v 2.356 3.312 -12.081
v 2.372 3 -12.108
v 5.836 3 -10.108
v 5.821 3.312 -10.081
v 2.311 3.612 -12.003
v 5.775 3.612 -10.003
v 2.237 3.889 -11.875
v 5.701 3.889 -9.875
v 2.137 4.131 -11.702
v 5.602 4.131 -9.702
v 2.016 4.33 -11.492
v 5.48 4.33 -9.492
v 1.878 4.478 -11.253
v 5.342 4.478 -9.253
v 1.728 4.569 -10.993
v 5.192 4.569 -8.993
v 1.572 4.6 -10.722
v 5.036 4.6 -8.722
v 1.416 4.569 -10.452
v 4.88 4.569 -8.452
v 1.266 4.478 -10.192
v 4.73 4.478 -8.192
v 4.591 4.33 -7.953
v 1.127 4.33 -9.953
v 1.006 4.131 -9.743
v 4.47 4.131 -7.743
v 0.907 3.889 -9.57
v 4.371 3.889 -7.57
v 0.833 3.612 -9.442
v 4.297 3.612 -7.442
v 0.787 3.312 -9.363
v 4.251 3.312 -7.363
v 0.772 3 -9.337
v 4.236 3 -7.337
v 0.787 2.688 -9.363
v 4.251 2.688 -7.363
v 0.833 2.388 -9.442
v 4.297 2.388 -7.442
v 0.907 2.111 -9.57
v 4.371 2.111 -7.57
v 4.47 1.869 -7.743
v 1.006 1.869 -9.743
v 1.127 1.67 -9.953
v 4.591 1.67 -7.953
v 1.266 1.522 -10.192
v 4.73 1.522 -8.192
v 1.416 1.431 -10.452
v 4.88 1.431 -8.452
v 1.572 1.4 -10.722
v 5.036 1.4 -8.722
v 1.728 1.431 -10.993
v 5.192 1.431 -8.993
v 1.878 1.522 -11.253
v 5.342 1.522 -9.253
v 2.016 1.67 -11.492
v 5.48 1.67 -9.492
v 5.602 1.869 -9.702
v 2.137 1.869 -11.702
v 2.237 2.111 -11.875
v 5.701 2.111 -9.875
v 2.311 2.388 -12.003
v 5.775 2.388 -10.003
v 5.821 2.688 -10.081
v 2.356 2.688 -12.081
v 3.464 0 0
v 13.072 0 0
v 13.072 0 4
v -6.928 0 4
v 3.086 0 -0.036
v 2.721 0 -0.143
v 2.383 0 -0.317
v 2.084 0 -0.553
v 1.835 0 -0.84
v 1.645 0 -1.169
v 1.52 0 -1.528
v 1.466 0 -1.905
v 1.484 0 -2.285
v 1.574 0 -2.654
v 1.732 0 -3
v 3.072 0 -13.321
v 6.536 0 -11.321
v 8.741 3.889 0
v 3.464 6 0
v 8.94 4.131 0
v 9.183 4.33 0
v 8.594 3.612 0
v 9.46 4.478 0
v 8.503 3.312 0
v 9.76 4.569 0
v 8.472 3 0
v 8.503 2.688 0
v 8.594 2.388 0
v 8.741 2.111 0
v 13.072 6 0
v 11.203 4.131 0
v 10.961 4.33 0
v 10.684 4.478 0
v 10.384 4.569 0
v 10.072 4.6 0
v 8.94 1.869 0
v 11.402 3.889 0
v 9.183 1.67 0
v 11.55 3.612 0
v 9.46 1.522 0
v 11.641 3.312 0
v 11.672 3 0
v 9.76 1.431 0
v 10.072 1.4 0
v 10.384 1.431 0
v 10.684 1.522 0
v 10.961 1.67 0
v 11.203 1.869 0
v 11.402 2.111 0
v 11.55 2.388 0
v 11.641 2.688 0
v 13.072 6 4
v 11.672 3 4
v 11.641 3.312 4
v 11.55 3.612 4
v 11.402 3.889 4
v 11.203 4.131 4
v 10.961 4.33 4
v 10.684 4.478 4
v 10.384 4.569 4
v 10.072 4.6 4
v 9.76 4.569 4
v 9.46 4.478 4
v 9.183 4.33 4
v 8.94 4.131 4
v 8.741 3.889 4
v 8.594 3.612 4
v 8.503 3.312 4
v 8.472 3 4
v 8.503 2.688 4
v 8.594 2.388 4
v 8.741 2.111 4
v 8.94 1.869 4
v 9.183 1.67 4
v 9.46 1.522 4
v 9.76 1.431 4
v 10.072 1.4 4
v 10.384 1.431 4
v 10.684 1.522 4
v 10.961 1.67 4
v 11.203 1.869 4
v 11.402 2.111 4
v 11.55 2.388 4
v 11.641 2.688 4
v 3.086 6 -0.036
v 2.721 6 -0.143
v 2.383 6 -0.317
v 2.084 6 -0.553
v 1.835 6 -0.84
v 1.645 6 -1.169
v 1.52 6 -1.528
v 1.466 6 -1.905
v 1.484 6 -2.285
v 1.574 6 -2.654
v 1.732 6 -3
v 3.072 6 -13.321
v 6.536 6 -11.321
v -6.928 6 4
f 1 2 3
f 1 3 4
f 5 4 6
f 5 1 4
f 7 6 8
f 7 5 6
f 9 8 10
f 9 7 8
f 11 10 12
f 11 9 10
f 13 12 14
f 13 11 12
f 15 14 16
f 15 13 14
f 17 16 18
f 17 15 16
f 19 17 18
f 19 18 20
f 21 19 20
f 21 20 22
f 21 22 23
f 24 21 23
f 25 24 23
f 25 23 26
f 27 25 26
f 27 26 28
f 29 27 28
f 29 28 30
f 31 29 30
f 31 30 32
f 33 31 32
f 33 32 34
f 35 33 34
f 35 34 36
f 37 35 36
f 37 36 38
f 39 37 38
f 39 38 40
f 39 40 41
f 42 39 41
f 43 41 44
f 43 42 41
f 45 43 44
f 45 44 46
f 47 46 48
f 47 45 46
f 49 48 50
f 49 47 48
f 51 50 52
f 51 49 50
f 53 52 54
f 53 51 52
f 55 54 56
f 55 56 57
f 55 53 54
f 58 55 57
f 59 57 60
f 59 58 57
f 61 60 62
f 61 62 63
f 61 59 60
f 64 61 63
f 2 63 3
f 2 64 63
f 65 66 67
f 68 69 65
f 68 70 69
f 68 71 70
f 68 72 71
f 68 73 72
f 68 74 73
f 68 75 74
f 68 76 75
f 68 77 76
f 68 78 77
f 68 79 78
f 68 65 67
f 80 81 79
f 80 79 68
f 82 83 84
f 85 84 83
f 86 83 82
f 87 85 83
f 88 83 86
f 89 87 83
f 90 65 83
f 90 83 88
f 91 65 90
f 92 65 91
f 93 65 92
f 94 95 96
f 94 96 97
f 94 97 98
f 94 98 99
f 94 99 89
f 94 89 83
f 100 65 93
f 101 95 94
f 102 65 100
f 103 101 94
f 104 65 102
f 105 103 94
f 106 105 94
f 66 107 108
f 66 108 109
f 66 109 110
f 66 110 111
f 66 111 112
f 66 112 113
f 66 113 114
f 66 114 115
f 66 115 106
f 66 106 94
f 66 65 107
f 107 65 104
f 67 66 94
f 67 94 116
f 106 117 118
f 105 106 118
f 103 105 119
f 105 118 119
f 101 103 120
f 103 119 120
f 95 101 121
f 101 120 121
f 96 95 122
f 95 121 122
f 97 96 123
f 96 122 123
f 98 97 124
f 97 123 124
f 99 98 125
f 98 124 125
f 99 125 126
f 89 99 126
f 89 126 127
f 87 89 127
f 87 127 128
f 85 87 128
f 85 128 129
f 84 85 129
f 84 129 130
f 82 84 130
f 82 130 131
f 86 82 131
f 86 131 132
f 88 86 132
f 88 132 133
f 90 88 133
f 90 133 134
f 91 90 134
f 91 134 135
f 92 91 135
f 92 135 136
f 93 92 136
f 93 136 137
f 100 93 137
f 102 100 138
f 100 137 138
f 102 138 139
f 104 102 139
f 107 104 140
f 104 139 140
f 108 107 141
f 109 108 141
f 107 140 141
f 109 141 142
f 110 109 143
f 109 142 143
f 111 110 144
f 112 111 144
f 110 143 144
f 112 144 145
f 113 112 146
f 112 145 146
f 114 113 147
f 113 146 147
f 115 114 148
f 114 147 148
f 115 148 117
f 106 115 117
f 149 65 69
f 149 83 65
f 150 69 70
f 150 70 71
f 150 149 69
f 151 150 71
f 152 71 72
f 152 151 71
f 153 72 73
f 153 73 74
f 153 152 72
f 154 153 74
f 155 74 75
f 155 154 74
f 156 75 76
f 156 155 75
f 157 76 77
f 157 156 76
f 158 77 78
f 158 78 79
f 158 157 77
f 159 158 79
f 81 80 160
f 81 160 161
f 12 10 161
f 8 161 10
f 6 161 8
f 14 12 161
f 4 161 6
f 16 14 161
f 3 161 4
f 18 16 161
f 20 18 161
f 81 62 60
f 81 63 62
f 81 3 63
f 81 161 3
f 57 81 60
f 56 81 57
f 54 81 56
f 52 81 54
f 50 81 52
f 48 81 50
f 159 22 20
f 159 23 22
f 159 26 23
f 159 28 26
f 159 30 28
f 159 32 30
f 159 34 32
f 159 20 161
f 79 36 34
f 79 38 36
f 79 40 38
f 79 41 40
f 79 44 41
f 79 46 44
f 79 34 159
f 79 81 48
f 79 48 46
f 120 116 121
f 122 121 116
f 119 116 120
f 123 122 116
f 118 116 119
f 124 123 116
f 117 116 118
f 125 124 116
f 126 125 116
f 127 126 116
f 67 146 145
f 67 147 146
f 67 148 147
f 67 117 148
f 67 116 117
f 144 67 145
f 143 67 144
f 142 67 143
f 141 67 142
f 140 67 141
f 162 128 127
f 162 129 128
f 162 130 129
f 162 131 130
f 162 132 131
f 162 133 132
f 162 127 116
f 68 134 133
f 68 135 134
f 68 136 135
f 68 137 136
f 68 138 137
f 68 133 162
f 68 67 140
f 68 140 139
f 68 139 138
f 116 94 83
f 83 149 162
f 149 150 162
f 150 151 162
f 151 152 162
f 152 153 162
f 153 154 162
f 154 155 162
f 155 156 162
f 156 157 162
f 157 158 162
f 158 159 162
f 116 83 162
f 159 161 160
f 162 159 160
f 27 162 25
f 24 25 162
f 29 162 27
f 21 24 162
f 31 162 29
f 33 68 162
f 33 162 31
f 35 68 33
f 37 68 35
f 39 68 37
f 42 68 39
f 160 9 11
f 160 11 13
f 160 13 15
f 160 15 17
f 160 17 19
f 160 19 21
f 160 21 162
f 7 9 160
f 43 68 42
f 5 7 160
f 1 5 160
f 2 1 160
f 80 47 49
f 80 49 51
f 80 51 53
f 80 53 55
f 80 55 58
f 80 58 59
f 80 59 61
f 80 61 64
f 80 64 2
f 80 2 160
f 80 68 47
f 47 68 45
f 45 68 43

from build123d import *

# Parameters (mm, degrees)
EXTRUDE_1_DEPTH     = 6
CUT_EXTRUDE_1_REACH = 24.514
SKETCH_3_R          = 1.6
FILLET_1_R          = 2


with BuildPart() as part:
    # 草图2 → 凸台-拉伸1 (new body)
    with BuildSketch(Plane(origin=(0, 0, 0), x_dir=(1, 0, 0), z_dir=(0, 1, 0))):
        Polygon((0, 0), (13.07179677, 0), (13.07179677, -4), (-6.92820323, -4), (3.07179677, 13.320508076), (6.535898385, 11.320508076), align=None)
    extrude(amount=EXTRUDE_1_DEPTH)

    # 草图3 → 切除-拉伸1 (cut, up to next)
    with BuildSketch(Plane.XY.offset(4), mode=Mode.PRIVATE) as cut_extrude_1_sk1:
        with Locations((10.07179677, 3)):
            Circle(SKETCH_3_R)
    cut_extrude_1_tool1 = extrude(cut_extrude_1_sk1.sketch, amount=-CUT_EXTRUDE_1_REACH, mode=Mode.PRIVATE) & part.part
    cut_extrude_1 = cut_extrude_1_tool1.solids().sort_by_distance((10.071797, 3, 4))[0]
    add(cut_extrude_1, mode=Mode.SUBTRACT)

    # 镜向1: 切除-拉伸1 across plane
    add(cut_extrude_1.mirror(Plane(origin=(0, 0, 0), x_dir=(-0.8660254037844399, 0, 0.4999999999999978), z_dir=(0.4999999999999983, 0, 0.8660254037844398))), mode=Mode.SUBTRACT)

    # 圆角1
    fillet_1_edges = [part.edges().sort_by_distance(p)[0] for p in [
        (0, 3, 0),
    ]]
    fillet(fillet_1_edges, radius=FILLET_1_R)


solid = part.part
